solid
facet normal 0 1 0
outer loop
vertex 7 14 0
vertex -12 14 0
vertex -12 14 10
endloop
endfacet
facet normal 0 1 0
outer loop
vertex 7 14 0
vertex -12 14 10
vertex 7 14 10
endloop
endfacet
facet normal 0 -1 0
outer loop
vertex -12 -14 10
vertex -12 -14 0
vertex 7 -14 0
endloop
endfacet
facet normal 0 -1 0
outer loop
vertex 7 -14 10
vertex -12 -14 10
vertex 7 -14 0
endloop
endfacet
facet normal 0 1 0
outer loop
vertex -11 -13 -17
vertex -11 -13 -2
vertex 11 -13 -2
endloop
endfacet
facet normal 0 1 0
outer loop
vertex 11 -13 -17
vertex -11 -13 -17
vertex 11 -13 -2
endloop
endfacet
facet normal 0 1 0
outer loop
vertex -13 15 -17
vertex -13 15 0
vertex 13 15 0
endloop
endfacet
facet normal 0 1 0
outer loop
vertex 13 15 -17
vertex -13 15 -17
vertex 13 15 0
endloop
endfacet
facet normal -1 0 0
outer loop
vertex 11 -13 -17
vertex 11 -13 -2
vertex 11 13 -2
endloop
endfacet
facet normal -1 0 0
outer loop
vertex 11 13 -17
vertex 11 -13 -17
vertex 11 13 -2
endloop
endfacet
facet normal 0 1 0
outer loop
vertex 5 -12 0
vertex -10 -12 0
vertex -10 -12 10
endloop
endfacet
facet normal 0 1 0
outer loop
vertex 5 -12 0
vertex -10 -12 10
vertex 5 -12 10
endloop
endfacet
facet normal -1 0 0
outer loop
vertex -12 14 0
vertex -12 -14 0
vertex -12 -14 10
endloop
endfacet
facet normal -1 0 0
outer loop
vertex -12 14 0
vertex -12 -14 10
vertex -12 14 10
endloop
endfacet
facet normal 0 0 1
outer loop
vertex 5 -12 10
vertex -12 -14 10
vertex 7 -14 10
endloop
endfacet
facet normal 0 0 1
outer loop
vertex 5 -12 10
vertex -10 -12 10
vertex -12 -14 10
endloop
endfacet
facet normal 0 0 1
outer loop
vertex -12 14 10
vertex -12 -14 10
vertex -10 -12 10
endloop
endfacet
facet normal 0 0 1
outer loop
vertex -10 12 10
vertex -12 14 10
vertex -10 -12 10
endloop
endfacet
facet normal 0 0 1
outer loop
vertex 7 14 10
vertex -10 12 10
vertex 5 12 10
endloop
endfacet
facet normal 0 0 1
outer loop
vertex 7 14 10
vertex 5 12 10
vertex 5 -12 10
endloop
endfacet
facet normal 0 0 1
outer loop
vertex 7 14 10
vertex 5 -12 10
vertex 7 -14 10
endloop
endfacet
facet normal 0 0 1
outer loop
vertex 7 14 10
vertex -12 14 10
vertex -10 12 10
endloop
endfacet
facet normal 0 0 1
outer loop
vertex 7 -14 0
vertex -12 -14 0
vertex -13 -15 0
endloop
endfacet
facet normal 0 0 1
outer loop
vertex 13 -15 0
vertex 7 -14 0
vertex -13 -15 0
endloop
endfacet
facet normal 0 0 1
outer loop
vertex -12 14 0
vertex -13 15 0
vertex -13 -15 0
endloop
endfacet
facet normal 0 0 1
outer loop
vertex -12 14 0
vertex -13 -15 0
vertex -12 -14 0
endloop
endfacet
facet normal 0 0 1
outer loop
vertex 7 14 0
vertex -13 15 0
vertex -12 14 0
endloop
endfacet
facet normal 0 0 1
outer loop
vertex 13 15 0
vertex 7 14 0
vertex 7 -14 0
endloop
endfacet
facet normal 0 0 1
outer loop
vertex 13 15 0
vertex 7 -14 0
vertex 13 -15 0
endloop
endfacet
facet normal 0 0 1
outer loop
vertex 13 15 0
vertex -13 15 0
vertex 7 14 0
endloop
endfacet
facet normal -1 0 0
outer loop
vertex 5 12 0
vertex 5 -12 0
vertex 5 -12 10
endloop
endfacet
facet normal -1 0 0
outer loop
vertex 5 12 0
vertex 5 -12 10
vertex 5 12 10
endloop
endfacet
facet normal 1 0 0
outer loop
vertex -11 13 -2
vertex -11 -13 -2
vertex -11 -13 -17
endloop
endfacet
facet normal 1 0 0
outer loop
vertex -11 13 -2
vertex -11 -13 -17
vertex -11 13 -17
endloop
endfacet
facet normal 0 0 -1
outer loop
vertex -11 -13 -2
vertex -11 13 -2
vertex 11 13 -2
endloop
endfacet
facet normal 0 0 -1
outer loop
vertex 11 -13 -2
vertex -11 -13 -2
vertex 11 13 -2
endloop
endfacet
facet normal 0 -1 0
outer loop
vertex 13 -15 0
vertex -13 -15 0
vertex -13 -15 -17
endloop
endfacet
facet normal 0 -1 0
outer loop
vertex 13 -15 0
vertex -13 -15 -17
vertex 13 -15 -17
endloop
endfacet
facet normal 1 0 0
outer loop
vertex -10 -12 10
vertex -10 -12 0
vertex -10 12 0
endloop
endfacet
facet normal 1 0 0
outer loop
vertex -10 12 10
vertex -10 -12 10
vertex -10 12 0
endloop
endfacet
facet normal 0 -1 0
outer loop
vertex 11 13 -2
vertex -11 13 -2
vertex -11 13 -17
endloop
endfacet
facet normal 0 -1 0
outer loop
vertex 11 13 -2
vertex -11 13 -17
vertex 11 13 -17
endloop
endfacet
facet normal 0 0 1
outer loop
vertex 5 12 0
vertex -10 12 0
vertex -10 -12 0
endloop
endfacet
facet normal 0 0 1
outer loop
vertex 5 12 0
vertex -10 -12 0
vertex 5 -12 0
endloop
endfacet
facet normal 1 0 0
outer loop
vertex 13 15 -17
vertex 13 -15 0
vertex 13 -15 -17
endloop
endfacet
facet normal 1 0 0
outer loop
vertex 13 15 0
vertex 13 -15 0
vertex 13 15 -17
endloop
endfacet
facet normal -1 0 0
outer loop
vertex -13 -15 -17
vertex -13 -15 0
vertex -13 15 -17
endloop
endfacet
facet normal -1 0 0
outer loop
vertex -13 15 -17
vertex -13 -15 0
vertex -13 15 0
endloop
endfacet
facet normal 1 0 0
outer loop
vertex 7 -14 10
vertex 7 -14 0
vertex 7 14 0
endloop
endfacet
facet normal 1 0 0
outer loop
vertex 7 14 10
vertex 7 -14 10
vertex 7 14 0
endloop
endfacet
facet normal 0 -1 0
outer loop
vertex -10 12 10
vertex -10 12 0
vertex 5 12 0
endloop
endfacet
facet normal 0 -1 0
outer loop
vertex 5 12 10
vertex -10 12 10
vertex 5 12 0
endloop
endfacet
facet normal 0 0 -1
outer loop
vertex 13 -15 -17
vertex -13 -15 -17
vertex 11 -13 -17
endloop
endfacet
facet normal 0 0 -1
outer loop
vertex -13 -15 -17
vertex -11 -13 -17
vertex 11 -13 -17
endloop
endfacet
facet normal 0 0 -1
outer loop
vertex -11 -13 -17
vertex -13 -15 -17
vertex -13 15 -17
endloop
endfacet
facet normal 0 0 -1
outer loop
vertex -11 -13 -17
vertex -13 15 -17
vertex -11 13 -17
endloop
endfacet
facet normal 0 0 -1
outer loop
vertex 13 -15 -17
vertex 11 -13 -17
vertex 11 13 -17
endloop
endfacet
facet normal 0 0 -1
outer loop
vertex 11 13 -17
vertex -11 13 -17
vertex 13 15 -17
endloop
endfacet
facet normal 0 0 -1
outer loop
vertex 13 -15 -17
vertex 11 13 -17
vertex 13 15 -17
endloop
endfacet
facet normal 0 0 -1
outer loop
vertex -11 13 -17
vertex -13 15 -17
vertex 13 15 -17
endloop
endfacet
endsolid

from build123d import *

# Parameters (mm, degrees)
F0_W     = 26
F0_H     = 30
F0_W_2   = 22
F0_H_2   = 26
F1_DEPTH = 17
F2_DEPTH = 2
F3_W     = 19
F3_H     = 28
F3_W_2   = 15
F3_H_2   = 24
F4_DEPTH = 10


with BuildPart() as f1:
    # F0 (on Top) → F1 (new body)
    with BuildSketch(Plane.XY):
        Rectangle(F0_W, F0_H)
        Rectangle(F0_W_2, F0_H_2, mode=Mode.SUBTRACT)
    extrude(amount=-F1_DEPTH)

    # F0 (on Top) → F2 (join)
    with BuildSketch(Plane.XY):
        Rectangle(F0_W_2, F0_H_2)
    extrude(amount=-F2_DEPTH)

    # F3 (on Top) → F4 (join)
    with BuildSketch(Plane.XY):
        with Locations((-2.5, 0)):
            Rectangle(F3_W, F3_H)
        with Locations((-2.5, 0)):
            Rectangle(F3_W_2, F3_H_2, mode=Mode.SUBTRACT)
    extrude(amount=F4_DEPTH)


solid = f1.part
